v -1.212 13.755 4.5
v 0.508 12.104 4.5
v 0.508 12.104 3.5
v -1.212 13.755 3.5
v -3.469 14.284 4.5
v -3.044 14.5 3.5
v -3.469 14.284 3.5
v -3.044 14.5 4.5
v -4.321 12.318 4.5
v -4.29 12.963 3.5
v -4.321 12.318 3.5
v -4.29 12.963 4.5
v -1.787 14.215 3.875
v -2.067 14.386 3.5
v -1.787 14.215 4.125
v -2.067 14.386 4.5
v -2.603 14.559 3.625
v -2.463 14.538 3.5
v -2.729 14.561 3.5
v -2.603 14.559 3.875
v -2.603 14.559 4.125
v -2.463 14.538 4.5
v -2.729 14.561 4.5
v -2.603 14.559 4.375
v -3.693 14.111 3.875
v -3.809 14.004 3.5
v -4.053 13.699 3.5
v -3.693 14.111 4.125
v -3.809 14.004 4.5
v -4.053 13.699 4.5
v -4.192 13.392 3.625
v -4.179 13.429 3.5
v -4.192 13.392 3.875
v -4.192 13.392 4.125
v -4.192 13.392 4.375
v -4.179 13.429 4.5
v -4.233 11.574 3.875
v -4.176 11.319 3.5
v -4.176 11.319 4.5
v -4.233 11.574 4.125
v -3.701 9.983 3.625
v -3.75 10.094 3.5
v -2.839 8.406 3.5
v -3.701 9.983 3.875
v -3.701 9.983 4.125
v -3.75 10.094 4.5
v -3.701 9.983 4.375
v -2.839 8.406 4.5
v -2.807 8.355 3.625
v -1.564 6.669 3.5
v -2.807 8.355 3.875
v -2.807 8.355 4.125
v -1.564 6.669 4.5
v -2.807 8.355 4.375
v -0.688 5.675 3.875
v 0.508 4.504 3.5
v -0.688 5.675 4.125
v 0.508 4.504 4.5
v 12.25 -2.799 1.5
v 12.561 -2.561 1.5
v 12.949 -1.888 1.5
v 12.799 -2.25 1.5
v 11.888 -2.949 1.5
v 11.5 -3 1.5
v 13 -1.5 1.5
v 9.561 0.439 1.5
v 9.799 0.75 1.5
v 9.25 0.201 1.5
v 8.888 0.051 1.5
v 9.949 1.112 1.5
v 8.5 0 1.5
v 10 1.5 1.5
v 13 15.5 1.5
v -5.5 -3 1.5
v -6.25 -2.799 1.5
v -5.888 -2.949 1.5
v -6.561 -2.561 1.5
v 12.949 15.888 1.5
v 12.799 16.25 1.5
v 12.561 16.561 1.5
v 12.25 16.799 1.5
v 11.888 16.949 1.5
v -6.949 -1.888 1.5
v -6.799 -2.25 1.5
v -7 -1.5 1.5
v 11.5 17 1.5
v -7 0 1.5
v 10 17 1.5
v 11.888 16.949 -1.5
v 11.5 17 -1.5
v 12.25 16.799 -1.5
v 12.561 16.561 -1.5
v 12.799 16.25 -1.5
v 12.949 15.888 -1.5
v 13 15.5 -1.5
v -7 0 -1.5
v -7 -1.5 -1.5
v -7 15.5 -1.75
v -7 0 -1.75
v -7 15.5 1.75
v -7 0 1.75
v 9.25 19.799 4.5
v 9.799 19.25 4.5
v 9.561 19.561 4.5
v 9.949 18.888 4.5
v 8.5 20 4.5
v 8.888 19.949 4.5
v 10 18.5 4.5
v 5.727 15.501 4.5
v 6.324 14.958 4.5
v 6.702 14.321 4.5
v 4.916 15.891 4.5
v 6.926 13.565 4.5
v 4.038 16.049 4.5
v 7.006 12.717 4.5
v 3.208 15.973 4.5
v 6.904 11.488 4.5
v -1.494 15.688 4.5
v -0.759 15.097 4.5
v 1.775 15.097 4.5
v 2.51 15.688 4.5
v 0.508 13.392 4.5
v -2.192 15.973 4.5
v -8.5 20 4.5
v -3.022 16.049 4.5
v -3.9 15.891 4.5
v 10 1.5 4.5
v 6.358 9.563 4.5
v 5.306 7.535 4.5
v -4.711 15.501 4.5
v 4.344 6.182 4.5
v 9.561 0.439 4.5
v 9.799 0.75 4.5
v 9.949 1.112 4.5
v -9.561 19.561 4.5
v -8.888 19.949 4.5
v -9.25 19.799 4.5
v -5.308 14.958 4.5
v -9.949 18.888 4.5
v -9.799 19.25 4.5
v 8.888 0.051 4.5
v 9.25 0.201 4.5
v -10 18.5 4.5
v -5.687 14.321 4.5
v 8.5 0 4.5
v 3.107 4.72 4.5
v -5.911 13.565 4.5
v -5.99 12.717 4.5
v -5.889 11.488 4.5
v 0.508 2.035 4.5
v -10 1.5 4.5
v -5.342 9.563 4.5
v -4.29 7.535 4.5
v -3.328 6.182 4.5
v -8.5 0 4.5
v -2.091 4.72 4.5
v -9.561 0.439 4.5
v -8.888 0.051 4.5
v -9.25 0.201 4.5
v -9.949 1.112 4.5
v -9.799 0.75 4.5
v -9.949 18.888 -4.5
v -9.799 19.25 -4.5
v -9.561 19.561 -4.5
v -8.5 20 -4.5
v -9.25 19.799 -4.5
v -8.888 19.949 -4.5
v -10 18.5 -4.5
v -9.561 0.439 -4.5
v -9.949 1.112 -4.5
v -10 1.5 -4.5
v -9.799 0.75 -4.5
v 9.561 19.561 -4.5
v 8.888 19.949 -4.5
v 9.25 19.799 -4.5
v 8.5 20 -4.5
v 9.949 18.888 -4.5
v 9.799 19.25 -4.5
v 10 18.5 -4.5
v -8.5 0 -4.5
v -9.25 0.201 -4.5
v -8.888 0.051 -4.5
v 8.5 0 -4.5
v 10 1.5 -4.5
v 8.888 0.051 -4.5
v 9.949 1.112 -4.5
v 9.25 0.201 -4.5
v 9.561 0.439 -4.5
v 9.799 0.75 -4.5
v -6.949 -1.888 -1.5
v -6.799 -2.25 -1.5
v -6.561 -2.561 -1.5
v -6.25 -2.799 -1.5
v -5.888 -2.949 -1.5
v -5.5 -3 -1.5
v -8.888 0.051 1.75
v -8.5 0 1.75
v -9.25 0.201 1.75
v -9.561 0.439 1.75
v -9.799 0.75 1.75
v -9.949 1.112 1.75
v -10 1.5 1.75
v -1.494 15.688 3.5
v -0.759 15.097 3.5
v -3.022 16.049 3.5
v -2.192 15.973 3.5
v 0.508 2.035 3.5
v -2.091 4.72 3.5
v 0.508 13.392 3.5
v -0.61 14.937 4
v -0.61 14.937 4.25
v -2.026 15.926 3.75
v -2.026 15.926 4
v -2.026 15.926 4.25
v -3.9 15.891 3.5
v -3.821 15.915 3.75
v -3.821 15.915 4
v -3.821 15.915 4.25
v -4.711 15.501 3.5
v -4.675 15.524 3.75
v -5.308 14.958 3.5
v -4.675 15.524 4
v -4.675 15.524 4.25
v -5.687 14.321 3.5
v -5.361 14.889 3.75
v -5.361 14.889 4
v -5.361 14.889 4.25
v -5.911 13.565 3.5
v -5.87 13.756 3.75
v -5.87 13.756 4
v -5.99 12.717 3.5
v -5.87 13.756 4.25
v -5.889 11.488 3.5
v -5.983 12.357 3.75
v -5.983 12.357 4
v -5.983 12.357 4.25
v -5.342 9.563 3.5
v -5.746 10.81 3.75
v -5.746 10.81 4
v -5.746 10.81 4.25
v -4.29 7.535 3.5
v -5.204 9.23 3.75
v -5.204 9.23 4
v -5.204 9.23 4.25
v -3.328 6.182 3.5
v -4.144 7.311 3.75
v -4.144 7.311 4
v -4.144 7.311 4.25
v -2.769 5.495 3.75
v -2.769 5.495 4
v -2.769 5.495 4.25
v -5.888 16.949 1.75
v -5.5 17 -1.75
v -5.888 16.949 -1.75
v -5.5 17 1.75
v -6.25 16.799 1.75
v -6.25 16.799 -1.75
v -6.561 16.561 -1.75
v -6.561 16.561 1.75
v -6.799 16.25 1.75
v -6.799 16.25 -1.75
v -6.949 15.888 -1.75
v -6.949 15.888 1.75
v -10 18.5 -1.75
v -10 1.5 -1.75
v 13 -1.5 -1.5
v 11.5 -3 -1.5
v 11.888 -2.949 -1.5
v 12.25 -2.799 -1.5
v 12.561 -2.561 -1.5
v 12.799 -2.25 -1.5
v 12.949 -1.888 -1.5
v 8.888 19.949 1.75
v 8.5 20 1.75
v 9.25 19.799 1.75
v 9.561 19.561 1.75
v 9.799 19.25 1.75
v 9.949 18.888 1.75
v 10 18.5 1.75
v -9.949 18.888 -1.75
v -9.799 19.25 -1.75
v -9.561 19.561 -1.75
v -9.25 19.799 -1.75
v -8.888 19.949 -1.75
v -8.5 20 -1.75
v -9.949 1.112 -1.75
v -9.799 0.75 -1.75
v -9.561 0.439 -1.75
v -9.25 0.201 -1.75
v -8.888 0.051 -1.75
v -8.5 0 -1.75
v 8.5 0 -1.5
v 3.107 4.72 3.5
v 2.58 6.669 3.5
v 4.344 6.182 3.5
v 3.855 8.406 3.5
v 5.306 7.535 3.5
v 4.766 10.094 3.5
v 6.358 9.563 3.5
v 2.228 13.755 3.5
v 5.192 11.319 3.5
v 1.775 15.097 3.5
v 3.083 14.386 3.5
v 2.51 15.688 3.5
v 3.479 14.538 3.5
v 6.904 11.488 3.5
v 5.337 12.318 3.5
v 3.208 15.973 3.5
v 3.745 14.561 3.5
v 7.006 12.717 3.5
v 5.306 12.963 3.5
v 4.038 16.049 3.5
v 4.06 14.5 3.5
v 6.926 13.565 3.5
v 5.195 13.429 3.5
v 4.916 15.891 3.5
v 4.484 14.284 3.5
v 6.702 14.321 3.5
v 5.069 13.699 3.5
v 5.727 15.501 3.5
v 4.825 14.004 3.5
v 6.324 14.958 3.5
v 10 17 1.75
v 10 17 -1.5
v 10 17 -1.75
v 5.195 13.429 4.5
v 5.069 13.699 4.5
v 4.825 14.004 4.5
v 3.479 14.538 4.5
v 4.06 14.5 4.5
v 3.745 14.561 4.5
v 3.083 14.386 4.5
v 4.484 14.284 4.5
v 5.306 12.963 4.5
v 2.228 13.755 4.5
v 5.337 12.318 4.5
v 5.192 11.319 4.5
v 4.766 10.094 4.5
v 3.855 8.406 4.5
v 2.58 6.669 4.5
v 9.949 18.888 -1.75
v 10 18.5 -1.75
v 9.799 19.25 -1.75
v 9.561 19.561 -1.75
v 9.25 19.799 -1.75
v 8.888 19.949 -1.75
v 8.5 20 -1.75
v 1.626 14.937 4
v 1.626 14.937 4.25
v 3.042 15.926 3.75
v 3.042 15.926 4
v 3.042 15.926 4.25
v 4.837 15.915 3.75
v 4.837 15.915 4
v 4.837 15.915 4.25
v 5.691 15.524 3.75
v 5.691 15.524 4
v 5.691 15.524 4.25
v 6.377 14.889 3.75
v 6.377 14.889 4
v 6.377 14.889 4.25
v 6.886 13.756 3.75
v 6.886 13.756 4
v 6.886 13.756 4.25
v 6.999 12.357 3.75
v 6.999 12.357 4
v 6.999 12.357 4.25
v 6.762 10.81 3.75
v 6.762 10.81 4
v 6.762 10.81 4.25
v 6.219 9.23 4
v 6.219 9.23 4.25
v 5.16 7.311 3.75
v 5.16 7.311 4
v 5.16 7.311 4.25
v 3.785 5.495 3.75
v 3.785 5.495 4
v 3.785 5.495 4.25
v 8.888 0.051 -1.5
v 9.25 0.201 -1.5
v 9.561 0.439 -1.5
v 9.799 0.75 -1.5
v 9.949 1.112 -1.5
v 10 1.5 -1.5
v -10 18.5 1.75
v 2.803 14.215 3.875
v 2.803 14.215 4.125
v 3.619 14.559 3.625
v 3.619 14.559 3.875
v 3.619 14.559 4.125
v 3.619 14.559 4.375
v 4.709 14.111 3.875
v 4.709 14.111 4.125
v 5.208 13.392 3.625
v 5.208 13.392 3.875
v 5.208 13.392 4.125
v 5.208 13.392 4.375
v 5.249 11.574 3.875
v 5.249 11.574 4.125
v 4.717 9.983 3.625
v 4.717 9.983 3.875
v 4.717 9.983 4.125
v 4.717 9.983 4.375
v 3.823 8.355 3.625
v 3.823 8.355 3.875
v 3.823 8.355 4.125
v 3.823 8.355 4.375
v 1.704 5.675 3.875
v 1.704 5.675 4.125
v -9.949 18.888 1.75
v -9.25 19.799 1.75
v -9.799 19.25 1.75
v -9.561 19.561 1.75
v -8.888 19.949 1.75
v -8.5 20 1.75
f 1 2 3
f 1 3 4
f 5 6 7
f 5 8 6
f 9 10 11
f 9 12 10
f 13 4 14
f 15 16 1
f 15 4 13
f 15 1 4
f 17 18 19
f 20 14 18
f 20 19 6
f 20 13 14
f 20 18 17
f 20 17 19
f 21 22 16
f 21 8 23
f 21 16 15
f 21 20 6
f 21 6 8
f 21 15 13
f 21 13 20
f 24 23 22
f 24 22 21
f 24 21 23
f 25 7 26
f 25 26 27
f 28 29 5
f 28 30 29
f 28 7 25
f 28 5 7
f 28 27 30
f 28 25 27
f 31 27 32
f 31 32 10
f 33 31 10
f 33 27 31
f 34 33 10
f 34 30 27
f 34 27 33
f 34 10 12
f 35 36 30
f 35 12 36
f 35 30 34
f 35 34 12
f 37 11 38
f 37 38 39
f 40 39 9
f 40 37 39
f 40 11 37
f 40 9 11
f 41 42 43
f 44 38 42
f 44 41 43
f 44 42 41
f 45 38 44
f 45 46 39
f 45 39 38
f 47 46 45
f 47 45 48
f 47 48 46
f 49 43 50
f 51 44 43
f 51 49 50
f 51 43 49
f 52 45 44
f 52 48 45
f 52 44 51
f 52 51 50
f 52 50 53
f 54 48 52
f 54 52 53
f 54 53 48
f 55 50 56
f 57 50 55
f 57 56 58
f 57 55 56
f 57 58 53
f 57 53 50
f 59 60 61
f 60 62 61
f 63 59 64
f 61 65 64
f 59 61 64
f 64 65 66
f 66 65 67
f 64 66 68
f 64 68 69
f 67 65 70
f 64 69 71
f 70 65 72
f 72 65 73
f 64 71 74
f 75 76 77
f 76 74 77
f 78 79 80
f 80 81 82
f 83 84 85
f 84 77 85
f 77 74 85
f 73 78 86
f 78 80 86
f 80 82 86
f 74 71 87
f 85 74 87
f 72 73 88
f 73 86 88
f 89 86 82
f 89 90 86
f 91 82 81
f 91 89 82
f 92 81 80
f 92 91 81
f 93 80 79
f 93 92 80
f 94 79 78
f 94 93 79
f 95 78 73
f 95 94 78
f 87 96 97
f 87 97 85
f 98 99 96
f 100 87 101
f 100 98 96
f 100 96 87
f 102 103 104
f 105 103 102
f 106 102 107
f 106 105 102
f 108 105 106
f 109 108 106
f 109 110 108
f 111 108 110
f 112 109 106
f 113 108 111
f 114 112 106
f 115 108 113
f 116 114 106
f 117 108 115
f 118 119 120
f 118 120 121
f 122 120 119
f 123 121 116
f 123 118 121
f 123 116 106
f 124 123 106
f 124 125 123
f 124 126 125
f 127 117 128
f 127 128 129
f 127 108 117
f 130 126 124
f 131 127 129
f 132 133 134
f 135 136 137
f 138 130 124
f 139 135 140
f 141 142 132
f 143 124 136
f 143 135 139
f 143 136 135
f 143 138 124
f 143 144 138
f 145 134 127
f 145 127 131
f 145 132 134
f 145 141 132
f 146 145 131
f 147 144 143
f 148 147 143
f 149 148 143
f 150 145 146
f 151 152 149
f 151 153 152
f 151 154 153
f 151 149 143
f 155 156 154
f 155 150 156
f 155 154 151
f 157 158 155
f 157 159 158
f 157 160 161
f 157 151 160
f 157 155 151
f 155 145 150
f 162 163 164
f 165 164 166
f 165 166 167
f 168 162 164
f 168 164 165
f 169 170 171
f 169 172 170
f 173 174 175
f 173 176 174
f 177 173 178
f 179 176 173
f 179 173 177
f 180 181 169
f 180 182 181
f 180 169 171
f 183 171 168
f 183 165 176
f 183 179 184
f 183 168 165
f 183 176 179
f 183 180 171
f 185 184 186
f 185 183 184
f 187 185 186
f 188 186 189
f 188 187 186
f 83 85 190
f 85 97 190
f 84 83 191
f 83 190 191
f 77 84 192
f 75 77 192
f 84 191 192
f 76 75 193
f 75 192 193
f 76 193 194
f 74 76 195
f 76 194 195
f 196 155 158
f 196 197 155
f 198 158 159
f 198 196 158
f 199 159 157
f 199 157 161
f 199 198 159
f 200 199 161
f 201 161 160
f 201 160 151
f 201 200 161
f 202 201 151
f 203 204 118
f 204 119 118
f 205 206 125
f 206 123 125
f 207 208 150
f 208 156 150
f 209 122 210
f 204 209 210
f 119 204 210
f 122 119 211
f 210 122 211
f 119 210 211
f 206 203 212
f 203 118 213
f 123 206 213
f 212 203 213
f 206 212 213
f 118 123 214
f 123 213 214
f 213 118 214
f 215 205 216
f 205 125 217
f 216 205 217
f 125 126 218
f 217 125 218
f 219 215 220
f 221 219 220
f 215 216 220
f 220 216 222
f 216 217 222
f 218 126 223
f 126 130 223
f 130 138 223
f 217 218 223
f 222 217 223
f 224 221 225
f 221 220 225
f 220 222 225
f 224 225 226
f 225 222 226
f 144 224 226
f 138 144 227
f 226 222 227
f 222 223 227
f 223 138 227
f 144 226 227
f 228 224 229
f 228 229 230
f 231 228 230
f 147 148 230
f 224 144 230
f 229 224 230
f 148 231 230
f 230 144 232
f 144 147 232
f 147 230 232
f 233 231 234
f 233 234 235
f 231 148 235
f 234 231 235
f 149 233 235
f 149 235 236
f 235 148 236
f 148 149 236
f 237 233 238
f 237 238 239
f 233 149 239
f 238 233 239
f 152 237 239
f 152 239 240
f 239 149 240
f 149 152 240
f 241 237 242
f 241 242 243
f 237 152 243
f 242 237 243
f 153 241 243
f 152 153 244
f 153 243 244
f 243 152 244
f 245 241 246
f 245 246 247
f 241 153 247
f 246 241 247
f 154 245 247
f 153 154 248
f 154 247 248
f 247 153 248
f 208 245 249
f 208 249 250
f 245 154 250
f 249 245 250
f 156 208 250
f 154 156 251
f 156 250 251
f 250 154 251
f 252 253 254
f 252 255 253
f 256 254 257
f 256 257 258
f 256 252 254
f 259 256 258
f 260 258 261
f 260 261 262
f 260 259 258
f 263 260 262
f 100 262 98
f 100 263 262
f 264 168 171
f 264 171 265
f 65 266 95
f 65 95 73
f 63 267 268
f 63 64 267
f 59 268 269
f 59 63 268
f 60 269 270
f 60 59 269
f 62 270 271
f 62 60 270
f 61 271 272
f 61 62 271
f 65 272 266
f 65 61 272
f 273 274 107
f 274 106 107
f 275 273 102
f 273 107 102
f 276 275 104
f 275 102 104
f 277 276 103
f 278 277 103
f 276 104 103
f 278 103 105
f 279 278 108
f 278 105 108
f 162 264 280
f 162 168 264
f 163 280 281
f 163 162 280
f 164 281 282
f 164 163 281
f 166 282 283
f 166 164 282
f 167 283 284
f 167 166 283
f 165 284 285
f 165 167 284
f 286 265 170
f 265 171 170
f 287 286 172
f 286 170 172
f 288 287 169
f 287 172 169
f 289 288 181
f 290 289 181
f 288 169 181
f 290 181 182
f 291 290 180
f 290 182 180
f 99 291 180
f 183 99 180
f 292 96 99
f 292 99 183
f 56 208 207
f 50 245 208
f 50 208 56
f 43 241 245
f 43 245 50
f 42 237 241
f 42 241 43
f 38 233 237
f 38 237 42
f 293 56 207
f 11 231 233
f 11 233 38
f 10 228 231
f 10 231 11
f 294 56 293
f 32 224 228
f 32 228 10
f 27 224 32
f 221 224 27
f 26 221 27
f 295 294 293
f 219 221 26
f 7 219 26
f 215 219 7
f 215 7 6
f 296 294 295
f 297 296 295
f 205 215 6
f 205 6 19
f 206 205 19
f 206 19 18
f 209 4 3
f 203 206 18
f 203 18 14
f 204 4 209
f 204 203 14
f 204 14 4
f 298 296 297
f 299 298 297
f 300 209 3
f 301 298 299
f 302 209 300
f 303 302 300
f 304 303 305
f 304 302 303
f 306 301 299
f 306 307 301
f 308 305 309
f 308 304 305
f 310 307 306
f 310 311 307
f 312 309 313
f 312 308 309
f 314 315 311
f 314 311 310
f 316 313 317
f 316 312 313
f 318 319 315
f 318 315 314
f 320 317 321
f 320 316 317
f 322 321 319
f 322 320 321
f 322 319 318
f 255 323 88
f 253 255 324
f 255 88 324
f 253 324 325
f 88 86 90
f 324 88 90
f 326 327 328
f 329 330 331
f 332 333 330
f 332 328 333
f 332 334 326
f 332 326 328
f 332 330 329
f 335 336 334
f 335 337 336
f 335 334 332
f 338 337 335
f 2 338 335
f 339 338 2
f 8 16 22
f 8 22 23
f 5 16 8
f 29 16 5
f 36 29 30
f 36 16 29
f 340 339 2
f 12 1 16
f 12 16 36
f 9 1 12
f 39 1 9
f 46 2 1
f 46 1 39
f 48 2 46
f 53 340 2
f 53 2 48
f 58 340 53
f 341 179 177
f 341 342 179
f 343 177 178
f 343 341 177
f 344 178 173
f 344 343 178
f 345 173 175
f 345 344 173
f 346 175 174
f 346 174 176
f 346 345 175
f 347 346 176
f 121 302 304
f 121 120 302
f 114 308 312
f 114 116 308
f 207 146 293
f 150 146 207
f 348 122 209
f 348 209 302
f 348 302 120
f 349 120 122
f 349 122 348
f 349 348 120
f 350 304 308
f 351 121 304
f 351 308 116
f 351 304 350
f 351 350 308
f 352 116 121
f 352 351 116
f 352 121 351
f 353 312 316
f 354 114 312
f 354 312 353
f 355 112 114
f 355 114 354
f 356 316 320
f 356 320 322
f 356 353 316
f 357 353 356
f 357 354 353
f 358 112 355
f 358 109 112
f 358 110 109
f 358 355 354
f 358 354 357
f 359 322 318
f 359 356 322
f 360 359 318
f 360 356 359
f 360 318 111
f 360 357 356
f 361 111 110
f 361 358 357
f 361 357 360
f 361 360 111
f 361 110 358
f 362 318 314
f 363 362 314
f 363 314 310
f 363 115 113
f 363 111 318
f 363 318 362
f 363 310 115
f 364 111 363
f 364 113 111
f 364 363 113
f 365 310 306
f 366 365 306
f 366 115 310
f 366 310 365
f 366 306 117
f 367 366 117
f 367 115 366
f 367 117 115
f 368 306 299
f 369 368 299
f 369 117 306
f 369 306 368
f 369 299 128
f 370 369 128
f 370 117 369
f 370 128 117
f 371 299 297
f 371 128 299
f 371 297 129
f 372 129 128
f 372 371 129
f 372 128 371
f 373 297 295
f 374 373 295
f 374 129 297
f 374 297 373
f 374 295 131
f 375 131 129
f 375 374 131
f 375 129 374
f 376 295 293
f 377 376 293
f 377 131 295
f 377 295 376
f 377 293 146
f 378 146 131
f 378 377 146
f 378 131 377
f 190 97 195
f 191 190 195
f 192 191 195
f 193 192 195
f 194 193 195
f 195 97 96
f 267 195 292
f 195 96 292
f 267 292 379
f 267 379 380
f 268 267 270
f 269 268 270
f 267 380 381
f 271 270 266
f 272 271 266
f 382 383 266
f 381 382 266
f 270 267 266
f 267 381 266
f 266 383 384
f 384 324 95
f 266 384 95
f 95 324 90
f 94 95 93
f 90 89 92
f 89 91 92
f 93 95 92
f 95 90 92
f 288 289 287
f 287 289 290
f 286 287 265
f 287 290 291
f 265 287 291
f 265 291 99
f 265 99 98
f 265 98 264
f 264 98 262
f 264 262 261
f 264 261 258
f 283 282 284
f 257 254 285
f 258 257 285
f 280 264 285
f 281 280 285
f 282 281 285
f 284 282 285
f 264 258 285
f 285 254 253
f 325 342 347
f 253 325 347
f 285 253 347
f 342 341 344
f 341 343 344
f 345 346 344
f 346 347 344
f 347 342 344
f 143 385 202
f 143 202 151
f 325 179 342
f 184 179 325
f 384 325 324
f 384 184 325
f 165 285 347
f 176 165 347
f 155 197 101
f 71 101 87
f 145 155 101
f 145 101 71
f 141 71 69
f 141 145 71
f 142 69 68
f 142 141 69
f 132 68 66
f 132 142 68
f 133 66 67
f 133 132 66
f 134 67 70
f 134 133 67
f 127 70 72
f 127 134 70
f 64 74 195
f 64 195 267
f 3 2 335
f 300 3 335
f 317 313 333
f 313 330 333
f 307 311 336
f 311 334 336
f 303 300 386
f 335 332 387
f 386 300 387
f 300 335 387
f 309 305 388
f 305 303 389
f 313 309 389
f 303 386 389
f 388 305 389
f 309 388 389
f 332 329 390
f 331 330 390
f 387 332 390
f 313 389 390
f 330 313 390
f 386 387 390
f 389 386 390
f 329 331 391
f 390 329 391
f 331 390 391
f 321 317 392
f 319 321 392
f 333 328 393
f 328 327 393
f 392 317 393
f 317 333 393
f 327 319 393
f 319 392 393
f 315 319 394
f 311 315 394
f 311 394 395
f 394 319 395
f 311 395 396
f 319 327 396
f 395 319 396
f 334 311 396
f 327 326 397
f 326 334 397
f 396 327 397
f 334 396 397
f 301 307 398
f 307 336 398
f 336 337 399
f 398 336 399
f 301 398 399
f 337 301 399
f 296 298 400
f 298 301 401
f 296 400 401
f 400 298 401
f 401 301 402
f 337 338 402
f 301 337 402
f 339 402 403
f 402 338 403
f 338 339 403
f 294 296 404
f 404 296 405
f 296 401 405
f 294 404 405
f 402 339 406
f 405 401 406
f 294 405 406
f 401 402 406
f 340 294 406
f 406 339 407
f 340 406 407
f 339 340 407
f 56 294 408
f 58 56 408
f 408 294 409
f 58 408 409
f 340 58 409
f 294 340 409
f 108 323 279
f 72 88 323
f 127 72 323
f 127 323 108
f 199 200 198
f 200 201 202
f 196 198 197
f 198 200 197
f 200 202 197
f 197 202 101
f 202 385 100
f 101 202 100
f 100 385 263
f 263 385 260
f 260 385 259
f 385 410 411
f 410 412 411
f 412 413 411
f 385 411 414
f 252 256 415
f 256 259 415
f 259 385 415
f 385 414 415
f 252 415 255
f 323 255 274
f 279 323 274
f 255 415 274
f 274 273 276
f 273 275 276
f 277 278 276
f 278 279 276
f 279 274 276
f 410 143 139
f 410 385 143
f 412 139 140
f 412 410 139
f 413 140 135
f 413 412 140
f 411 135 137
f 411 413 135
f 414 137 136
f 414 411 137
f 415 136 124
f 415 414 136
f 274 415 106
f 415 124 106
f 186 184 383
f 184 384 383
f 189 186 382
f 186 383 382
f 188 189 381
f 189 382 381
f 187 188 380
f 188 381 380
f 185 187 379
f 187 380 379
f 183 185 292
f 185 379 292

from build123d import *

# Parameters (mm, degrees)
F0_W     = 14
F0_H     = 3
F0_W_2   = 3
F1_DEPTH = 20
F2_DEPTH = 3
F3_W     = 3
F3_H     = 3
F4_DEPTH = 100
F5_W     = 3
F5_H     = 3.5
F6_DEPTH = 100
F7_R     = 1.5
F9_DEPTH = 1


with BuildPart() as f1:
    # F0 (on Front) → F1 (new body)
    with BuildSketch(Plane.XZ):
        Polygon((10, 1.5), (10, 4.5), (-10, 4.5), (-10, 1.5), (-7, 1.5), (7, 1.5), align=None)
        Rectangle(F0_W, F0_H)
        with Locations((11.5, 0)):
            Rectangle(F0_W_2, F0_H)
        with Locations((8.5, 0)):
            Rectangle(F0_W_2, F0_H)
        with Locations((-8.5, 0)):
            Rectangle(F0_W_2, F0_H)
        Polygon((10, -4.5), (10, -1.5), (7, -1.5), (-7, -1.5), (-10, -1.5), (-10, -4.5), align=None)
    extrude(amount=-F1_DEPTH)

    # F0 (on Front) → F2 (join)
    with BuildSketch(Plane.XZ):
        with Locations((-8.5, 0)):
            Rectangle(F0_W_2, F0_H)
        Rectangle(F0_W, F0_H)
        with Locations((8.5, 0)):
            Rectangle(F0_W_2, F0_H)
        with Locations((11.5, 0)):
            Rectangle(F0_W_2, F0_H)
    extrude(amount=F2_DEPTH)

    # F3 (on face) → F4 (cut)
    with BuildSketch(Plane.YZ.offset(13)):
        Polygon((23, -1.75), (23, 1.75), (17, 1.75), (17, 1.5), (20, 1.5), (20, -1.5), (17, -1.5), (17, -1.75), align=None)
        with Locations((18.5, 0)):
            Rectangle(F3_W, F3_H)
    extrude(amount=-F4_DEPTH, mode=Mode.SUBTRACT)

    # F5 (on face) → F6 (cut)
    with BuildSketch(Plane(origin=(0, 17, 0), x_dir=(-1, 0, 0), z_dir=(0, 1, 0))):
        with Locations((11.5, 0)):
            Rectangle(F5_W, F5_H)
        with Locations((8.5, 0)):
            Rectangle(F5_W, F5_H)
    extrude(amount=-F6_DEPTH, mode=Mode.SUBTRACT)

    # F7
    f7_edges = [f1.edges().sort_by_distance(p)[0] for p in [
        (-7, -3, 0),
        (13, -3, 0),
        (10, 0, 3),
        (10, 0, -3),
        (-10, 0, -3.125),
        (-10, 0, 3.125),
        (-7, 17, 0),
        (-10, 20, 3.125),
        (-10, 20, -3.125),
        (13, 17, 0),
        (10, 20, 3.125),
        (10, 20, -3.125),
    ]]
    fillet(f7_edges, radius=F7_R)

    # F8 (on face) → F9 (cut)
    with BuildSketch(Plane.XY.offset(4.5)):
        with BuildLine():
            Line((0.5079321563, 12.6308239996), (0.5079321563, 13.3923562244))
            add(Edge.make_bspline(
                [(0.5079321563, 13.3923562244), (-0.2042453086, 14.4841945601), (-1.6194856249, 16.653897794), (-6.4925619551, 15.4160387293), (-5.8372524097, 8.372899764), (-1.7703990856, 4.3107311976), (0.5079321563, 2.0350255072)],
                knots=[0, 0, 0, 0, 0.2063930363, 0.4101447224, 0.6695517086, 1, 1, 1, 1], degree=3))
            Line((0.5079321563, 2.0350255072), (0.5079321563, 3.2167136669))
            add(Edge.make_bspline(
                [(0.5079321563, 12.6308239996), (-0.2166217589, 13.5477579815), (-1.4496563968, 15.1081819987), (-3.2014964515, 15.467028439), (-5.0022320005, 14.3189482089), (-5.3079861121, 11.6387311218), (-3.4341416808, 7.1131911239), (-0.8432740412, 4.5522916121), (0.5079321563, 3.2167136669)],
                knots=[0, 0, 0, 0, 0.169604223, 0.2886298612, 0.4171601384, 0.5655007654, 0.7733969919, 1, 1, 1, 1], degree=3))
        make_face()
        with BuildLine():
            add(Edge.make_bspline(
                [(0.5079321563, 13.3923562244), (1.2201096213, 14.4841945601), (2.6353499375, 16.653897794), (7.5084262677, 15.4160387293), (6.8531167223, 8.372899764), (2.7862633983, 4.3107311976), (0.5079321563, 2.0350255072)],
                knots=[0, 0, 0, 0, 0.2063930363, 0.4101447224, 0.6695517086, 1, 1, 1, 1], degree=3))
            Line((0.5079321563, 13.3923562244), (0.5079321563, 12.6308239996))
            add(Edge.make_bspline(
                [(0.5079321563, 12.6308239996), (1.2324860716, 13.5477579815), (2.4655207094, 15.1081819987), (4.2173607642, 15.467028439), (6.0180963131, 14.3189482089), (6.3238504248, 11.6387311218), (4.4500059934, 7.1131911239), (1.8591383538, 4.5522916121), (0.5079321563, 3.2167136669)],
                knots=[0, 0, 0, 0, 0.169604223, 0.2886298612, 0.4171601384, 0.5655007654, 0.7733969919, 1, 1, 1, 1], degree=3))
            Line((0.5079321563, 3.2167136669), (0.5079321563, 2.0350255072))
        make_face()
        with BuildLine():
            add(Edge.make_bspline(
                [(0.5079321563, 12.6308239996), (1.2324860716, 13.5477579815), (2.4655207094, 15.1081819987), (4.2173607642, 15.467028439), (6.0180963131, 14.3189482089), (6.3238504248, 11.6387311218), (4.4500059934, 7.1131911239), (1.8591383538, 4.5522916121), (0.5079321563, 3.2167136669)],
                knots=[0, 0, 0, 0, 0.169604223, 0.2886298612, 0.4171601384, 0.5655007654, 0.7733969919, 1, 1, 1, 1], degree=3))
            Line((0.5079321563, 12.6308239996), (0.5079321563, 12.1036916971))
            add(Edge.make_bspline(
                [(0.5079321563, 12.1036916971), (0.9845350772, 12.5783972914), (1.9182678659, 13.5084136695), (3.5364426534, 14.9021637489), (4.7681552632, 14.1418940477), (5.3308142058, 13.4027101407), (5.4419389667, 11.3924890124), (3.9669526492, 8.2792374371), (1.784815358, 5.6918019484), (0.880360239, 4.8502334126), (0.5079321563, 4.5036990196)],
                knots=[0, 0, 0, 0, 0.1285135055, 0.2517762593, 0.348617425, 0.4320442691, 0.5523455091, 0.7197270075, 0.8845921433, 1, 1, 1, 1], degree=3))
            Line((0.5079321563, 4.5036990196), (0.5079321563, 3.2167136669))
        make_face()
        with BuildLine():
            Line((0.5079321563, 12.1036916971), (0.5079321563, 12.6308239996))
            add(Edge.make_bspline(
                [(0.5079321563, 12.6308239996), (-0.2166217589, 13.5477579815), (-1.4496563968, 15.1081819987), (-3.2014964515, 15.467028439), (-5.0022320005, 14.3189482089), (-5.3079861121, 11.6387311218), (-3.4341416808, 7.1131911239), (-0.8432740412, 4.5522916121), (0.5079321563, 3.2167136669)],
                knots=[0, 0, 0, 0, 0.169604223, 0.2886298612, 0.4171601384, 0.5655007654, 0.7733969919, 1, 1, 1, 1], degree=3))
            Line((0.5079321563, 3.2167136669), (0.5079321563, 4.5036990196))
            add(Edge.make_bspline(
                [(0.5079321563, 12.1036916971), (0.0313292355, 12.5783972914), (-0.9024035532, 13.5084136695), (-2.5205783407, 14.9021637489), (-3.7522909505, 14.1418940477), (-4.3149498931, 13.4027101407), (-4.426074654, 11.3924890124), (-2.9510883366, 8.2792374371), (-0.7689510454, 5.6918019484), (0.1355040736, 4.8502334126), (0.5079321563, 4.5036990196)],
                knots=[0, 0, 0, 0, 0.1285135055, 0.2517762593, 0.348617425, 0.4320442691, 0.5523455091, 0.7197270075, 0.8845921433, 1, 1, 1, 1], degree=3))
        make_face()
    extrude(amount=-F9_DEPTH, mode=Mode.SUBTRACT)


solid = f1.part
